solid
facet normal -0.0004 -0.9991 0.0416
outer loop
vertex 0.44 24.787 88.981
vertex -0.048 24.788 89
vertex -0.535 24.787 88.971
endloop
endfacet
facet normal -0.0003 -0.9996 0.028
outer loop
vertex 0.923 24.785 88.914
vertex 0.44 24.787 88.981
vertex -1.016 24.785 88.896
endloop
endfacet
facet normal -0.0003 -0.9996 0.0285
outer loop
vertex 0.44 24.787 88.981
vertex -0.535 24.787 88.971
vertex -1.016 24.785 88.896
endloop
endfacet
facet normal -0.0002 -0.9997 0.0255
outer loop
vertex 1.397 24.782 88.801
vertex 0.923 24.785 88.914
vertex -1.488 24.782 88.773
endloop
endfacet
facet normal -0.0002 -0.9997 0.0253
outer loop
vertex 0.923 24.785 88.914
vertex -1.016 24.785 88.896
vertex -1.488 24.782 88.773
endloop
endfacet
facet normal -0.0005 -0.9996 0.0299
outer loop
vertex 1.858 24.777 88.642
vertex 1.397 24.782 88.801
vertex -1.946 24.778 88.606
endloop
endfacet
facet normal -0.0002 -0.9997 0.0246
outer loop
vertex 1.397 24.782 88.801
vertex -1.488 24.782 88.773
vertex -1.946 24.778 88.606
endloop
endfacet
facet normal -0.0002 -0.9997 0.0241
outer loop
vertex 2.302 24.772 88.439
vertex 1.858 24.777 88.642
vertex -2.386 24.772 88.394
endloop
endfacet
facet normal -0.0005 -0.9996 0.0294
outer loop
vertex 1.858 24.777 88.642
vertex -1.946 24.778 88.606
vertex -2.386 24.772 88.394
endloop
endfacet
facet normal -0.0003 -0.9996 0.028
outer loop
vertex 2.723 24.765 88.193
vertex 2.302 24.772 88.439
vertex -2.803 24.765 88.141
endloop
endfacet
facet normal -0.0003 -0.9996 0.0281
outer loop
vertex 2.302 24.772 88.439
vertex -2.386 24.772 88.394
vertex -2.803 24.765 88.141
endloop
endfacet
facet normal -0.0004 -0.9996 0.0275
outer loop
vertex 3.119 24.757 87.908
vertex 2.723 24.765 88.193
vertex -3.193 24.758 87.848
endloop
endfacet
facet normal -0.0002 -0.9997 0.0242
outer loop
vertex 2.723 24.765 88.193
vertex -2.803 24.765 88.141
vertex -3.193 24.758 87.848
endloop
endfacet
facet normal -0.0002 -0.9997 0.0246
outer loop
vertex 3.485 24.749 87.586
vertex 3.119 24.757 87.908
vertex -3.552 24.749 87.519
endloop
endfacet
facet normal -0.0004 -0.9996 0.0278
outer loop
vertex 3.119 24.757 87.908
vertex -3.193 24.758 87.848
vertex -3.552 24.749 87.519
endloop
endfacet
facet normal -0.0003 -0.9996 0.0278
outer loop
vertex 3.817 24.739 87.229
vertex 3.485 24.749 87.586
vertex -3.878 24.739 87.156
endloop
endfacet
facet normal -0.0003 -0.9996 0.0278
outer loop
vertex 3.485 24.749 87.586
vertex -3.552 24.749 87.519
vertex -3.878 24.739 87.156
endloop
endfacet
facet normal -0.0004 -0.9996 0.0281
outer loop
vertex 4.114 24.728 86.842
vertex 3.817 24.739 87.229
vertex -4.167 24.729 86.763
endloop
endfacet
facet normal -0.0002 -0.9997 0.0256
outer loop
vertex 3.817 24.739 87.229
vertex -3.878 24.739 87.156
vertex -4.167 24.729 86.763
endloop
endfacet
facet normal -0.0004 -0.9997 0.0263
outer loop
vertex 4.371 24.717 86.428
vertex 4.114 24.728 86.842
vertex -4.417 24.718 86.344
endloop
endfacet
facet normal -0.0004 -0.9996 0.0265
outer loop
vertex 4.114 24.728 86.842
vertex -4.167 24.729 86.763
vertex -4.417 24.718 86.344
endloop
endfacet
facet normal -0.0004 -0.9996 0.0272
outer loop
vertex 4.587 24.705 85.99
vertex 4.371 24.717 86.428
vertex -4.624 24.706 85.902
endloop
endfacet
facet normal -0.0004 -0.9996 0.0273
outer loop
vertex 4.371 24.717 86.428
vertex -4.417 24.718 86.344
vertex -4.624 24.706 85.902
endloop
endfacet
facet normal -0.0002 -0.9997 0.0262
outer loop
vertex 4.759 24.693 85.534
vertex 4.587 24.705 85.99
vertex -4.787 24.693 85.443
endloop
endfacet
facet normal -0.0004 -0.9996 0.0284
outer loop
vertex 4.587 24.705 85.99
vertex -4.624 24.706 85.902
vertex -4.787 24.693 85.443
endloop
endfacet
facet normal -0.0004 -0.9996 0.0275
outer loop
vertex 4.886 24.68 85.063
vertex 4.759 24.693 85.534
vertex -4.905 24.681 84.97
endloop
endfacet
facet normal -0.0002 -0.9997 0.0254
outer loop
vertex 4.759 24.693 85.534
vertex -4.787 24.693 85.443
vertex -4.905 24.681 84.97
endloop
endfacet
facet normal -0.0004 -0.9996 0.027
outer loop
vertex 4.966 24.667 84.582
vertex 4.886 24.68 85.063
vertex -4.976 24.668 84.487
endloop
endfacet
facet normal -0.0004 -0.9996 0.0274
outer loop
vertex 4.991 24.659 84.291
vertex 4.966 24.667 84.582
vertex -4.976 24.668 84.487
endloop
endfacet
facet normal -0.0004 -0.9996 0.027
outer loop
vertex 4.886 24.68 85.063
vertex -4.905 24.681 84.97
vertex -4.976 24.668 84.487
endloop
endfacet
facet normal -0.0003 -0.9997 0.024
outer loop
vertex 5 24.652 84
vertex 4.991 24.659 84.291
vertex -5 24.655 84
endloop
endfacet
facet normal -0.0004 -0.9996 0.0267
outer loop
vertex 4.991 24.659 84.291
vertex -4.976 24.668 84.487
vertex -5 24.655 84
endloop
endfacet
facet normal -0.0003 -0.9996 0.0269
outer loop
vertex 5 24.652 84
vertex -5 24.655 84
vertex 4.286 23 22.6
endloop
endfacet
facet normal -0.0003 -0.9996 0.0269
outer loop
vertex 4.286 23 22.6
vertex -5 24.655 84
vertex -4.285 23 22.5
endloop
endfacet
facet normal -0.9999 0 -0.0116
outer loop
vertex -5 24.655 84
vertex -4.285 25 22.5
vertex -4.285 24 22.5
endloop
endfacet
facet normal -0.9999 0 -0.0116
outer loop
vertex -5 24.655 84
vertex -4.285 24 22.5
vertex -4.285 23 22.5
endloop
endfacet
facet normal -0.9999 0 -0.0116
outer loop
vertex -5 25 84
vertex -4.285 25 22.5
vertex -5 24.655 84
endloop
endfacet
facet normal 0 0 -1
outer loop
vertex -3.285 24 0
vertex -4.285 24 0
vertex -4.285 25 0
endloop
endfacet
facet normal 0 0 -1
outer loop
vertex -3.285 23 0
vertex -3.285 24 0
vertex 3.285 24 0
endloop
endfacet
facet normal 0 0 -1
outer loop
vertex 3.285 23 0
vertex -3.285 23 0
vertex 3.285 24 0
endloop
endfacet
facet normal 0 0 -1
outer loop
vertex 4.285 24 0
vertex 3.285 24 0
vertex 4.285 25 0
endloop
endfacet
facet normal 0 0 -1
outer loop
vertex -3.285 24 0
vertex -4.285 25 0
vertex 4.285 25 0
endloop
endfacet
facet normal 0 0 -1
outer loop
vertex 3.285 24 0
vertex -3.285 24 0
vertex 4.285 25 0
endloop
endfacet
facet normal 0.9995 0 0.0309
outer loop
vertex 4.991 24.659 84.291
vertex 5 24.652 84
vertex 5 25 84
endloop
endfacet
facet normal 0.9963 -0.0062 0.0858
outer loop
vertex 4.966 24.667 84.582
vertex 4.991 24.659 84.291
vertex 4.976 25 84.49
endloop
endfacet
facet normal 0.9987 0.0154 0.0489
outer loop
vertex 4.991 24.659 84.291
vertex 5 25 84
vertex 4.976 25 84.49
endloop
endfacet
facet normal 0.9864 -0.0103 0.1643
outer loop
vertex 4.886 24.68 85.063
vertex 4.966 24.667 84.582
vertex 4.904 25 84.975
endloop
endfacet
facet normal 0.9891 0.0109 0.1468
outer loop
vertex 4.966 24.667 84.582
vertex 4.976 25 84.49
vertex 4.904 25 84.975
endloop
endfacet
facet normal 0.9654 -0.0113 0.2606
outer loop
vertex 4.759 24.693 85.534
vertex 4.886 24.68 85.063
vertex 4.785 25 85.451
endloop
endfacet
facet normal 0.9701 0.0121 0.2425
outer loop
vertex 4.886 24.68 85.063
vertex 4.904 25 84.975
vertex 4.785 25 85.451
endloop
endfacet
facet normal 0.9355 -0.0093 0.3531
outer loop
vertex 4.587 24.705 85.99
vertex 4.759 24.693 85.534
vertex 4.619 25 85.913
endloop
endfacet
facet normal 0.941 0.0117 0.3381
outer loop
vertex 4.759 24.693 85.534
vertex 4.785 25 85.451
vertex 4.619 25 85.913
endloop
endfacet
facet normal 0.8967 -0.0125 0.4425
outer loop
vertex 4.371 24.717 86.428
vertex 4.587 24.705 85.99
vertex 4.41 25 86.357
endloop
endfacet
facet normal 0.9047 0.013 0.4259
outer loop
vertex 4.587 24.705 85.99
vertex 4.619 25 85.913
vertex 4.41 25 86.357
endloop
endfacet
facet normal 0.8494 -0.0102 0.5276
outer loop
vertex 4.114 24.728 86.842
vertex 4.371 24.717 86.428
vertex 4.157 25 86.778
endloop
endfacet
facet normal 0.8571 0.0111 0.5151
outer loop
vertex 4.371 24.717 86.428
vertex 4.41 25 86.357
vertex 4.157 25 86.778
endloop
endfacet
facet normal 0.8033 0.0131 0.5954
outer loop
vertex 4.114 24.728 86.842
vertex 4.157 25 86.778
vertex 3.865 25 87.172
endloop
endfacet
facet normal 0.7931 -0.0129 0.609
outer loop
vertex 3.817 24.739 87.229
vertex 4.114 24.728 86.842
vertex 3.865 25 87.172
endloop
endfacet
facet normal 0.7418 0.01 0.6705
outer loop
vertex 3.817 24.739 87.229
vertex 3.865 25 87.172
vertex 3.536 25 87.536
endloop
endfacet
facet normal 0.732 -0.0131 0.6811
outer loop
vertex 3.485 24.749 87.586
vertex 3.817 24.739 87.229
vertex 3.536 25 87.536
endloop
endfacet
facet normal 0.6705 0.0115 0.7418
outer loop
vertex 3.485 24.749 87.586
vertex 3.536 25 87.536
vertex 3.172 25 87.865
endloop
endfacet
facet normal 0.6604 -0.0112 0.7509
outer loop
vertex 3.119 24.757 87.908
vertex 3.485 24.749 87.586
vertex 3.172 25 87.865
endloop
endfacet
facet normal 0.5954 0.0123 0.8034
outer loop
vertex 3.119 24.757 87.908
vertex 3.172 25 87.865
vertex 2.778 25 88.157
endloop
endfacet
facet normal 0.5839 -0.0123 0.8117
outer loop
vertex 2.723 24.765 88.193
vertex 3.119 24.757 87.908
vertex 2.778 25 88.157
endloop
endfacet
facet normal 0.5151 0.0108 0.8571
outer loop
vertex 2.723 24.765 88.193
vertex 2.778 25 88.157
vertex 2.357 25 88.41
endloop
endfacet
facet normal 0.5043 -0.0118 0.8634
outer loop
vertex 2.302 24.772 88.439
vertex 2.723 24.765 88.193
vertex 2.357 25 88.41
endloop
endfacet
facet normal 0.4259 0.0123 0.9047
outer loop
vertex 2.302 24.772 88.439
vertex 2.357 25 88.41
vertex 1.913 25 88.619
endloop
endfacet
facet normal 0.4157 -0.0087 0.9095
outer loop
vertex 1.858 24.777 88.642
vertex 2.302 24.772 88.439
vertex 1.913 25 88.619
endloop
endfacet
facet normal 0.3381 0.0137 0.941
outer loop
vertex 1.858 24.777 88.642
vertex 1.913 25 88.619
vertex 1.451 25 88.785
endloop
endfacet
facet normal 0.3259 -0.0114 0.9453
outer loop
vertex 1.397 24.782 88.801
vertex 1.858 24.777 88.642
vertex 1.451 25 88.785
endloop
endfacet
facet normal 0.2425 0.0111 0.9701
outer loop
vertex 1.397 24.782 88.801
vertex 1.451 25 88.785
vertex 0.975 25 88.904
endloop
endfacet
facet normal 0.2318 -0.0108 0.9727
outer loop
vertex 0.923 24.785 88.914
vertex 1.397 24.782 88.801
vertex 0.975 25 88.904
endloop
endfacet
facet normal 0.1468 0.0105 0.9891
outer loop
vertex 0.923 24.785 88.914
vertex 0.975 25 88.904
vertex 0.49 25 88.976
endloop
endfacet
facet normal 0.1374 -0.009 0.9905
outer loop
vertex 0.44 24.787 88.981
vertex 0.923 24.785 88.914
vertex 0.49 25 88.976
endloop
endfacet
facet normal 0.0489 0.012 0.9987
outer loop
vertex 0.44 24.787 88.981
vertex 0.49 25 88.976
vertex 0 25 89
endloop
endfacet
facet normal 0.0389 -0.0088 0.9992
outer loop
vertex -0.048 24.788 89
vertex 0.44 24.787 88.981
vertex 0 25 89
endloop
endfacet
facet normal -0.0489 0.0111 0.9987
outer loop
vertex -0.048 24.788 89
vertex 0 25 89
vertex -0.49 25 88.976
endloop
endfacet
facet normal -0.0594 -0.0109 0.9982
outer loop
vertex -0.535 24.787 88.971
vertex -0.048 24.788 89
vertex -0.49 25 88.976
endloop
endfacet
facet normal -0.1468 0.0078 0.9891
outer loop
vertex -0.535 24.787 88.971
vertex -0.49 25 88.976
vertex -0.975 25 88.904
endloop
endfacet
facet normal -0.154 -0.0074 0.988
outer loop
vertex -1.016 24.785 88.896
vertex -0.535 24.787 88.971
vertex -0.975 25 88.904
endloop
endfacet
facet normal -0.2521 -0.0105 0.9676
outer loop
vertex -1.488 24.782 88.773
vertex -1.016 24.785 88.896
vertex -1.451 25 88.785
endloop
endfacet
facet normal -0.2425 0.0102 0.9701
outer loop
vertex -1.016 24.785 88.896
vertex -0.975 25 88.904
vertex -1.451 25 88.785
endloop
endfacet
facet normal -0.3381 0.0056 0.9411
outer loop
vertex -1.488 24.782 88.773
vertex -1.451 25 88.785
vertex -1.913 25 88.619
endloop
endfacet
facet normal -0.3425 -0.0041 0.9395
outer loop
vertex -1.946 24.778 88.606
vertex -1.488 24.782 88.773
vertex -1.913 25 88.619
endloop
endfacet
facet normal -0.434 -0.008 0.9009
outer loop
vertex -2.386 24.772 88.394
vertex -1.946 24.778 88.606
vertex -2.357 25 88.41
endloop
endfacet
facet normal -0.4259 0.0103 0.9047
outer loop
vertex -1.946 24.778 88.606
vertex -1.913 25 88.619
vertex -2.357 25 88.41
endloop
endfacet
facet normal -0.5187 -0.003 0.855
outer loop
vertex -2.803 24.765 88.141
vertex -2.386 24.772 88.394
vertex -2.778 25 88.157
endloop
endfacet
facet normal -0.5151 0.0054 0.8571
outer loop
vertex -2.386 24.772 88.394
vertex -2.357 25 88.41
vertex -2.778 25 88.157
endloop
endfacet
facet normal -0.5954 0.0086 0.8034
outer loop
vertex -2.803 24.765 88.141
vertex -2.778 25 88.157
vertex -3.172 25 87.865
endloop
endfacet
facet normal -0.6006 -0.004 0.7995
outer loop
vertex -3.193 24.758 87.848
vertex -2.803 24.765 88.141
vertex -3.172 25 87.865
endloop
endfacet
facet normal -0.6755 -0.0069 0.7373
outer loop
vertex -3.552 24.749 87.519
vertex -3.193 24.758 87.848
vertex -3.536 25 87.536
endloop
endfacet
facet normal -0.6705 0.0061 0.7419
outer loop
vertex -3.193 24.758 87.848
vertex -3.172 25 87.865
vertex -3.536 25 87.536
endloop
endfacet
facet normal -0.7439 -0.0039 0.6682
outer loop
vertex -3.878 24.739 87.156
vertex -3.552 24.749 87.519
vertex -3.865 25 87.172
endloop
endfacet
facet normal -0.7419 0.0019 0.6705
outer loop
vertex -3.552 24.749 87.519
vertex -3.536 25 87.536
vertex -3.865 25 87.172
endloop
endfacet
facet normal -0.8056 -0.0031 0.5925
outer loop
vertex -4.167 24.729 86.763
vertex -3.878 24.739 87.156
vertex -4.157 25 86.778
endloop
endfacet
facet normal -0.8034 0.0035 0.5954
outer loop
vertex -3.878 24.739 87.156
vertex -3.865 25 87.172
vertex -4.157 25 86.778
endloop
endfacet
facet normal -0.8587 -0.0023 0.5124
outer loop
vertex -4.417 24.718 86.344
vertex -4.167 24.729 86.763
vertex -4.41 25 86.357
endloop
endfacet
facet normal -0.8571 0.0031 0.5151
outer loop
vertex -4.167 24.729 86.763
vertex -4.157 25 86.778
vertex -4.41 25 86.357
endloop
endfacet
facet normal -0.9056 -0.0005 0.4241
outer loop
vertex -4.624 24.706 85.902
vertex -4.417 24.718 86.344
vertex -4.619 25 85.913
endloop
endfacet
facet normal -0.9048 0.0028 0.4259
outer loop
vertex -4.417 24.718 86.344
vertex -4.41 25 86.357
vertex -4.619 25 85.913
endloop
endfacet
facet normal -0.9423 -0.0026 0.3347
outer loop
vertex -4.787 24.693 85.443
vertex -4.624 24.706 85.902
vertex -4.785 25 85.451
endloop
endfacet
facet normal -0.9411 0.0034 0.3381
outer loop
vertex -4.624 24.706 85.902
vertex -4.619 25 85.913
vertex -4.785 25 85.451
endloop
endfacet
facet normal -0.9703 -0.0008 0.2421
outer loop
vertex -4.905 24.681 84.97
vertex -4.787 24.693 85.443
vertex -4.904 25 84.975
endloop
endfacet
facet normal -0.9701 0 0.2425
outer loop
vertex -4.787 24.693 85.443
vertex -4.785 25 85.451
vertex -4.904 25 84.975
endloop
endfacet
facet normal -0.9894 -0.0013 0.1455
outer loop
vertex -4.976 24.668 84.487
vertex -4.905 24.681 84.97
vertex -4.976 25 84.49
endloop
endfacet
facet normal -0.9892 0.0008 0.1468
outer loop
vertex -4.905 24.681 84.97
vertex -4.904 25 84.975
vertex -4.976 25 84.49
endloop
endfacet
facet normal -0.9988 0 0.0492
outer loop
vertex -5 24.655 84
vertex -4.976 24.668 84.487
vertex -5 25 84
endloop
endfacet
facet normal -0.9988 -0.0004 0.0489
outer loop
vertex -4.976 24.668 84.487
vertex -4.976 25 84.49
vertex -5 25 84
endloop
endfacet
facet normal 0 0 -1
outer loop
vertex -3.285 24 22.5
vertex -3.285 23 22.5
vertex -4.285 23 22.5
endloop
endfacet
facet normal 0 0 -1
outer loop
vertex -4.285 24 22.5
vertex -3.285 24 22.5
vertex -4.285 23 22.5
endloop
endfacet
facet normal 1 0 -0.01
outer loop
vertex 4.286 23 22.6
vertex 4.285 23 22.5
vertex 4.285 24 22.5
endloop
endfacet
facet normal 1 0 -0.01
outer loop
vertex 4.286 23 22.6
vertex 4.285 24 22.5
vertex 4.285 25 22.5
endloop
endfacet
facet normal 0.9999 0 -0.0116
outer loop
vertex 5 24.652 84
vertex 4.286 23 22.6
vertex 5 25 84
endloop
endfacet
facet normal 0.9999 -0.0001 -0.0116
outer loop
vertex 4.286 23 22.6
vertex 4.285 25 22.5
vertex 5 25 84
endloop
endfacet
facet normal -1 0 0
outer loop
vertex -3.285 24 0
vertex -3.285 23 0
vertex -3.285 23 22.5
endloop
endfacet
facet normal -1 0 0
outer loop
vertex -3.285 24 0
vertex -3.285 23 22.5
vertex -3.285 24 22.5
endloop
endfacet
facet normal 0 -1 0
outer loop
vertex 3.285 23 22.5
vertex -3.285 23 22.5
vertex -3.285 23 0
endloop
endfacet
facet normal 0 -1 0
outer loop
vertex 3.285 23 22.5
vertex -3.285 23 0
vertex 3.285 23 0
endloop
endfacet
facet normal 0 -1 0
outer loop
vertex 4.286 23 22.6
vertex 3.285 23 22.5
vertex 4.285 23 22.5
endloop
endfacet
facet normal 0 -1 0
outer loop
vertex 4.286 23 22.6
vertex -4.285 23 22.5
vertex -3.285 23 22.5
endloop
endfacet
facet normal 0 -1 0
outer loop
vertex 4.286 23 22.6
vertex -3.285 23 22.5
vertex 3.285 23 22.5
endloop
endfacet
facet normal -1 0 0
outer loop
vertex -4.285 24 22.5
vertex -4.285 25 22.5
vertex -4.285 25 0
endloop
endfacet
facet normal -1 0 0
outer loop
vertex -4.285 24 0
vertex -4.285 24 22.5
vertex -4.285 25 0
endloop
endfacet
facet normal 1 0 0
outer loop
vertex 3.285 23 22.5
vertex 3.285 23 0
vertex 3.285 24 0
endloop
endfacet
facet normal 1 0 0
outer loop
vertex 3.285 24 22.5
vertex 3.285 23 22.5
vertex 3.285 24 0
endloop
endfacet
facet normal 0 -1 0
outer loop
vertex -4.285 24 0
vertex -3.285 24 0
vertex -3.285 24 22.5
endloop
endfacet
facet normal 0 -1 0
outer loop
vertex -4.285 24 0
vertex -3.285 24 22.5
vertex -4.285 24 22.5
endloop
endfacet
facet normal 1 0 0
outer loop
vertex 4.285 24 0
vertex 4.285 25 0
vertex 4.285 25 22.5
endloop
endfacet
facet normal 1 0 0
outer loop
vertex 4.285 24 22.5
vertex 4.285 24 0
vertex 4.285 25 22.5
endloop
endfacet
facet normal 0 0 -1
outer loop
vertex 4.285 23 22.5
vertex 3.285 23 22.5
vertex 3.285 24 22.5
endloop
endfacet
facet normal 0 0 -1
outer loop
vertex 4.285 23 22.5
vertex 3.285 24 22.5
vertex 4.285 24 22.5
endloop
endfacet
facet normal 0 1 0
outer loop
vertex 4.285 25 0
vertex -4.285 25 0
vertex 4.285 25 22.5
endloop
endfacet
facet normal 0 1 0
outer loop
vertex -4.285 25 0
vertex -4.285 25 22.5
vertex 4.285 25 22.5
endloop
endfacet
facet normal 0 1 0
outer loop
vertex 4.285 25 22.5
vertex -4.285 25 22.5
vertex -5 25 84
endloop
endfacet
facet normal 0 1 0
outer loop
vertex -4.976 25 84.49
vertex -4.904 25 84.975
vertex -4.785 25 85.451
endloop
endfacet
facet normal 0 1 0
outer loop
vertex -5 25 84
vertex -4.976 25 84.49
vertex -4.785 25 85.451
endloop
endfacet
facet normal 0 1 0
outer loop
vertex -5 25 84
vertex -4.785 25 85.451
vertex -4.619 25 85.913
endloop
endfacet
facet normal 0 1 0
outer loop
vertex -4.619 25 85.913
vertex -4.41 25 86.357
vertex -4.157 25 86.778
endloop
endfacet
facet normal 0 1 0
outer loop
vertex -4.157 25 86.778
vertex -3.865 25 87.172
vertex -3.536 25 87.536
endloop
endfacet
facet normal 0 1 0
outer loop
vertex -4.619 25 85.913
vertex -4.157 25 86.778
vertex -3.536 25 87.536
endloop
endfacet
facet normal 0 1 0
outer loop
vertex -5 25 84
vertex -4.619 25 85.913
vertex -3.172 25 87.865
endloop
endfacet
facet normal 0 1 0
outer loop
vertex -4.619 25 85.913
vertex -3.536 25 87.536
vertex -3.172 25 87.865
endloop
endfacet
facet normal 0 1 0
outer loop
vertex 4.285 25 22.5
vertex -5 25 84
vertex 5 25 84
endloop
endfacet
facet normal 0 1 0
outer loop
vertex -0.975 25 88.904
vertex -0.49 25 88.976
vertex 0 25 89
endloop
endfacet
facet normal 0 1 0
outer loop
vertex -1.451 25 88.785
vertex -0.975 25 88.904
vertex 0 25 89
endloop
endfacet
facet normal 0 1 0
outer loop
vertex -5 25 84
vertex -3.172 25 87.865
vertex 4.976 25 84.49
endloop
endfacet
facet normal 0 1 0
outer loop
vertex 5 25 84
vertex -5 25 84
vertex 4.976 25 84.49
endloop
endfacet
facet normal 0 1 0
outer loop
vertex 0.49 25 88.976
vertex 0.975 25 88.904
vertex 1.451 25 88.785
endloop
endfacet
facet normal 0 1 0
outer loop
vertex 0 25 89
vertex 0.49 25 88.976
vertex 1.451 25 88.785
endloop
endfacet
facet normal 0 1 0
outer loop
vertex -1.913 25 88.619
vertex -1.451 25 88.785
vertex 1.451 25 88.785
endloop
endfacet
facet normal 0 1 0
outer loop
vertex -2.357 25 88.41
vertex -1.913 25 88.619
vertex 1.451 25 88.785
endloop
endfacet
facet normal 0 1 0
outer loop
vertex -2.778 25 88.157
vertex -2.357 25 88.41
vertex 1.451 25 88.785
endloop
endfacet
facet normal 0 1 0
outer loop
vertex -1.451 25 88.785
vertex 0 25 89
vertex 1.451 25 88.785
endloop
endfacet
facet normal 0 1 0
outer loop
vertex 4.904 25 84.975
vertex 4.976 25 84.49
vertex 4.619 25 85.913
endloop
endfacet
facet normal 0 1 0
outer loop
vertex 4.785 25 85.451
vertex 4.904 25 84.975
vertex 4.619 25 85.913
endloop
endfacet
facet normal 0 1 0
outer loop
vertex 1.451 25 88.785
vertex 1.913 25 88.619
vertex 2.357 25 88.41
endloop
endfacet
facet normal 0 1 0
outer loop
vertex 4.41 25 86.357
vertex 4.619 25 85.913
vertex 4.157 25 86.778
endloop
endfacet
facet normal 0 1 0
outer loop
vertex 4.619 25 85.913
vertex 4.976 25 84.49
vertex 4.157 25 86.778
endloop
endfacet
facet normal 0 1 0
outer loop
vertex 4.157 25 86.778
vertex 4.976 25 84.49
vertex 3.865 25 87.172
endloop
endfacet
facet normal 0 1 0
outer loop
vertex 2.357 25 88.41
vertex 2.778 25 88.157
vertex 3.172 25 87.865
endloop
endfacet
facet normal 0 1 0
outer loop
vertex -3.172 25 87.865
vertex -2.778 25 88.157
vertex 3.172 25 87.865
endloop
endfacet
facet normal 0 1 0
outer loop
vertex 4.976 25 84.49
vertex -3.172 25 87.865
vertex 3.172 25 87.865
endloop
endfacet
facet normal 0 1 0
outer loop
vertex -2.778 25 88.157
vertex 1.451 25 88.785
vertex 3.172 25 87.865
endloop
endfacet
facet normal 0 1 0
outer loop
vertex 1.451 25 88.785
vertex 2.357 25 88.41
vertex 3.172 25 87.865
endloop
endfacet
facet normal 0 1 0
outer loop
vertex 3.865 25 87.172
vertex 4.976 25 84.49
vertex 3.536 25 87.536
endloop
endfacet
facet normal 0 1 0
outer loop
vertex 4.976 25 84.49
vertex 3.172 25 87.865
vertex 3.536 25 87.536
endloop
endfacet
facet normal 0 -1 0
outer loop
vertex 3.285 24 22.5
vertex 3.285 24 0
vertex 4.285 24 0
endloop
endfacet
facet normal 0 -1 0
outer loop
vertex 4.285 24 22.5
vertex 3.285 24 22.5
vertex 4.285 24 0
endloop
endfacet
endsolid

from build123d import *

# Parameters (mm, degrees)
PAD003_DEPTH    = 2
POCKET004_DEPTH = 22.5
POCKET005_DEPTH = 10.058462


with BuildPart() as part:
    # Sketch010 → Pad003 (new body)
    with BuildSketch(Plane.XZ):
        with BuildLine():
            Line((-4.284857, 0), (4.284857, 0))
            Line((4.284857, 0), (4.284857, 22.5))
            Line((4.284857, 22.5), (5, 84))
            ThreePointArc((5, 84), (0, 89), (-5, 84))
            Line((-4.284857, 22.5), (-5, 84))
            Line((-4.284857, 22.5), (-4.284857, 0))
        make_face()
    extrude(amount=PAD003_DEPTH)

    # Sketch011 (on Face1 of Pad003) → Pocket004 (cut)
    with BuildSketch(Plane(origin=(0, 0, 0), x_dir=(1, 0, 0), z_dir=(0, 0, -1))):
        Polygon((-3.284857, 2), (-3.284857, 1), (-8.284857, 1), (-8.284857, 5.501038), align=None)
        Polygon((8.284857, 5.501038), (3.284857, 2), (3.284857, 1), (8.284857, 1), align=None)
    extrude(amount=-POCKET004_DEPTH, mode=Mode.SUBTRACT)

    # Sketch012 (on Face12 of Pocket004) → Pocket005 (cut, through all)
    with BuildSketch(Plane(origin=(-4.022675, 0, -0.046777), x_dir=(0.011628, 0, -0.999932), z_dir=(-0.999932, 0, -0.011628))):
        Polygon((-89.452459, 0.2), (-22.548301, 2), (-89.452459, 14.03), align=None)
    extrude(amount=-POCKET005_DEPTH, mode=Mode.SUBTRACT)


with BuildPart() as part_1:
    # Body001 placement: moved
    add(part.part.moved(Location((0, 25, 0))))


solid = part_1.part
